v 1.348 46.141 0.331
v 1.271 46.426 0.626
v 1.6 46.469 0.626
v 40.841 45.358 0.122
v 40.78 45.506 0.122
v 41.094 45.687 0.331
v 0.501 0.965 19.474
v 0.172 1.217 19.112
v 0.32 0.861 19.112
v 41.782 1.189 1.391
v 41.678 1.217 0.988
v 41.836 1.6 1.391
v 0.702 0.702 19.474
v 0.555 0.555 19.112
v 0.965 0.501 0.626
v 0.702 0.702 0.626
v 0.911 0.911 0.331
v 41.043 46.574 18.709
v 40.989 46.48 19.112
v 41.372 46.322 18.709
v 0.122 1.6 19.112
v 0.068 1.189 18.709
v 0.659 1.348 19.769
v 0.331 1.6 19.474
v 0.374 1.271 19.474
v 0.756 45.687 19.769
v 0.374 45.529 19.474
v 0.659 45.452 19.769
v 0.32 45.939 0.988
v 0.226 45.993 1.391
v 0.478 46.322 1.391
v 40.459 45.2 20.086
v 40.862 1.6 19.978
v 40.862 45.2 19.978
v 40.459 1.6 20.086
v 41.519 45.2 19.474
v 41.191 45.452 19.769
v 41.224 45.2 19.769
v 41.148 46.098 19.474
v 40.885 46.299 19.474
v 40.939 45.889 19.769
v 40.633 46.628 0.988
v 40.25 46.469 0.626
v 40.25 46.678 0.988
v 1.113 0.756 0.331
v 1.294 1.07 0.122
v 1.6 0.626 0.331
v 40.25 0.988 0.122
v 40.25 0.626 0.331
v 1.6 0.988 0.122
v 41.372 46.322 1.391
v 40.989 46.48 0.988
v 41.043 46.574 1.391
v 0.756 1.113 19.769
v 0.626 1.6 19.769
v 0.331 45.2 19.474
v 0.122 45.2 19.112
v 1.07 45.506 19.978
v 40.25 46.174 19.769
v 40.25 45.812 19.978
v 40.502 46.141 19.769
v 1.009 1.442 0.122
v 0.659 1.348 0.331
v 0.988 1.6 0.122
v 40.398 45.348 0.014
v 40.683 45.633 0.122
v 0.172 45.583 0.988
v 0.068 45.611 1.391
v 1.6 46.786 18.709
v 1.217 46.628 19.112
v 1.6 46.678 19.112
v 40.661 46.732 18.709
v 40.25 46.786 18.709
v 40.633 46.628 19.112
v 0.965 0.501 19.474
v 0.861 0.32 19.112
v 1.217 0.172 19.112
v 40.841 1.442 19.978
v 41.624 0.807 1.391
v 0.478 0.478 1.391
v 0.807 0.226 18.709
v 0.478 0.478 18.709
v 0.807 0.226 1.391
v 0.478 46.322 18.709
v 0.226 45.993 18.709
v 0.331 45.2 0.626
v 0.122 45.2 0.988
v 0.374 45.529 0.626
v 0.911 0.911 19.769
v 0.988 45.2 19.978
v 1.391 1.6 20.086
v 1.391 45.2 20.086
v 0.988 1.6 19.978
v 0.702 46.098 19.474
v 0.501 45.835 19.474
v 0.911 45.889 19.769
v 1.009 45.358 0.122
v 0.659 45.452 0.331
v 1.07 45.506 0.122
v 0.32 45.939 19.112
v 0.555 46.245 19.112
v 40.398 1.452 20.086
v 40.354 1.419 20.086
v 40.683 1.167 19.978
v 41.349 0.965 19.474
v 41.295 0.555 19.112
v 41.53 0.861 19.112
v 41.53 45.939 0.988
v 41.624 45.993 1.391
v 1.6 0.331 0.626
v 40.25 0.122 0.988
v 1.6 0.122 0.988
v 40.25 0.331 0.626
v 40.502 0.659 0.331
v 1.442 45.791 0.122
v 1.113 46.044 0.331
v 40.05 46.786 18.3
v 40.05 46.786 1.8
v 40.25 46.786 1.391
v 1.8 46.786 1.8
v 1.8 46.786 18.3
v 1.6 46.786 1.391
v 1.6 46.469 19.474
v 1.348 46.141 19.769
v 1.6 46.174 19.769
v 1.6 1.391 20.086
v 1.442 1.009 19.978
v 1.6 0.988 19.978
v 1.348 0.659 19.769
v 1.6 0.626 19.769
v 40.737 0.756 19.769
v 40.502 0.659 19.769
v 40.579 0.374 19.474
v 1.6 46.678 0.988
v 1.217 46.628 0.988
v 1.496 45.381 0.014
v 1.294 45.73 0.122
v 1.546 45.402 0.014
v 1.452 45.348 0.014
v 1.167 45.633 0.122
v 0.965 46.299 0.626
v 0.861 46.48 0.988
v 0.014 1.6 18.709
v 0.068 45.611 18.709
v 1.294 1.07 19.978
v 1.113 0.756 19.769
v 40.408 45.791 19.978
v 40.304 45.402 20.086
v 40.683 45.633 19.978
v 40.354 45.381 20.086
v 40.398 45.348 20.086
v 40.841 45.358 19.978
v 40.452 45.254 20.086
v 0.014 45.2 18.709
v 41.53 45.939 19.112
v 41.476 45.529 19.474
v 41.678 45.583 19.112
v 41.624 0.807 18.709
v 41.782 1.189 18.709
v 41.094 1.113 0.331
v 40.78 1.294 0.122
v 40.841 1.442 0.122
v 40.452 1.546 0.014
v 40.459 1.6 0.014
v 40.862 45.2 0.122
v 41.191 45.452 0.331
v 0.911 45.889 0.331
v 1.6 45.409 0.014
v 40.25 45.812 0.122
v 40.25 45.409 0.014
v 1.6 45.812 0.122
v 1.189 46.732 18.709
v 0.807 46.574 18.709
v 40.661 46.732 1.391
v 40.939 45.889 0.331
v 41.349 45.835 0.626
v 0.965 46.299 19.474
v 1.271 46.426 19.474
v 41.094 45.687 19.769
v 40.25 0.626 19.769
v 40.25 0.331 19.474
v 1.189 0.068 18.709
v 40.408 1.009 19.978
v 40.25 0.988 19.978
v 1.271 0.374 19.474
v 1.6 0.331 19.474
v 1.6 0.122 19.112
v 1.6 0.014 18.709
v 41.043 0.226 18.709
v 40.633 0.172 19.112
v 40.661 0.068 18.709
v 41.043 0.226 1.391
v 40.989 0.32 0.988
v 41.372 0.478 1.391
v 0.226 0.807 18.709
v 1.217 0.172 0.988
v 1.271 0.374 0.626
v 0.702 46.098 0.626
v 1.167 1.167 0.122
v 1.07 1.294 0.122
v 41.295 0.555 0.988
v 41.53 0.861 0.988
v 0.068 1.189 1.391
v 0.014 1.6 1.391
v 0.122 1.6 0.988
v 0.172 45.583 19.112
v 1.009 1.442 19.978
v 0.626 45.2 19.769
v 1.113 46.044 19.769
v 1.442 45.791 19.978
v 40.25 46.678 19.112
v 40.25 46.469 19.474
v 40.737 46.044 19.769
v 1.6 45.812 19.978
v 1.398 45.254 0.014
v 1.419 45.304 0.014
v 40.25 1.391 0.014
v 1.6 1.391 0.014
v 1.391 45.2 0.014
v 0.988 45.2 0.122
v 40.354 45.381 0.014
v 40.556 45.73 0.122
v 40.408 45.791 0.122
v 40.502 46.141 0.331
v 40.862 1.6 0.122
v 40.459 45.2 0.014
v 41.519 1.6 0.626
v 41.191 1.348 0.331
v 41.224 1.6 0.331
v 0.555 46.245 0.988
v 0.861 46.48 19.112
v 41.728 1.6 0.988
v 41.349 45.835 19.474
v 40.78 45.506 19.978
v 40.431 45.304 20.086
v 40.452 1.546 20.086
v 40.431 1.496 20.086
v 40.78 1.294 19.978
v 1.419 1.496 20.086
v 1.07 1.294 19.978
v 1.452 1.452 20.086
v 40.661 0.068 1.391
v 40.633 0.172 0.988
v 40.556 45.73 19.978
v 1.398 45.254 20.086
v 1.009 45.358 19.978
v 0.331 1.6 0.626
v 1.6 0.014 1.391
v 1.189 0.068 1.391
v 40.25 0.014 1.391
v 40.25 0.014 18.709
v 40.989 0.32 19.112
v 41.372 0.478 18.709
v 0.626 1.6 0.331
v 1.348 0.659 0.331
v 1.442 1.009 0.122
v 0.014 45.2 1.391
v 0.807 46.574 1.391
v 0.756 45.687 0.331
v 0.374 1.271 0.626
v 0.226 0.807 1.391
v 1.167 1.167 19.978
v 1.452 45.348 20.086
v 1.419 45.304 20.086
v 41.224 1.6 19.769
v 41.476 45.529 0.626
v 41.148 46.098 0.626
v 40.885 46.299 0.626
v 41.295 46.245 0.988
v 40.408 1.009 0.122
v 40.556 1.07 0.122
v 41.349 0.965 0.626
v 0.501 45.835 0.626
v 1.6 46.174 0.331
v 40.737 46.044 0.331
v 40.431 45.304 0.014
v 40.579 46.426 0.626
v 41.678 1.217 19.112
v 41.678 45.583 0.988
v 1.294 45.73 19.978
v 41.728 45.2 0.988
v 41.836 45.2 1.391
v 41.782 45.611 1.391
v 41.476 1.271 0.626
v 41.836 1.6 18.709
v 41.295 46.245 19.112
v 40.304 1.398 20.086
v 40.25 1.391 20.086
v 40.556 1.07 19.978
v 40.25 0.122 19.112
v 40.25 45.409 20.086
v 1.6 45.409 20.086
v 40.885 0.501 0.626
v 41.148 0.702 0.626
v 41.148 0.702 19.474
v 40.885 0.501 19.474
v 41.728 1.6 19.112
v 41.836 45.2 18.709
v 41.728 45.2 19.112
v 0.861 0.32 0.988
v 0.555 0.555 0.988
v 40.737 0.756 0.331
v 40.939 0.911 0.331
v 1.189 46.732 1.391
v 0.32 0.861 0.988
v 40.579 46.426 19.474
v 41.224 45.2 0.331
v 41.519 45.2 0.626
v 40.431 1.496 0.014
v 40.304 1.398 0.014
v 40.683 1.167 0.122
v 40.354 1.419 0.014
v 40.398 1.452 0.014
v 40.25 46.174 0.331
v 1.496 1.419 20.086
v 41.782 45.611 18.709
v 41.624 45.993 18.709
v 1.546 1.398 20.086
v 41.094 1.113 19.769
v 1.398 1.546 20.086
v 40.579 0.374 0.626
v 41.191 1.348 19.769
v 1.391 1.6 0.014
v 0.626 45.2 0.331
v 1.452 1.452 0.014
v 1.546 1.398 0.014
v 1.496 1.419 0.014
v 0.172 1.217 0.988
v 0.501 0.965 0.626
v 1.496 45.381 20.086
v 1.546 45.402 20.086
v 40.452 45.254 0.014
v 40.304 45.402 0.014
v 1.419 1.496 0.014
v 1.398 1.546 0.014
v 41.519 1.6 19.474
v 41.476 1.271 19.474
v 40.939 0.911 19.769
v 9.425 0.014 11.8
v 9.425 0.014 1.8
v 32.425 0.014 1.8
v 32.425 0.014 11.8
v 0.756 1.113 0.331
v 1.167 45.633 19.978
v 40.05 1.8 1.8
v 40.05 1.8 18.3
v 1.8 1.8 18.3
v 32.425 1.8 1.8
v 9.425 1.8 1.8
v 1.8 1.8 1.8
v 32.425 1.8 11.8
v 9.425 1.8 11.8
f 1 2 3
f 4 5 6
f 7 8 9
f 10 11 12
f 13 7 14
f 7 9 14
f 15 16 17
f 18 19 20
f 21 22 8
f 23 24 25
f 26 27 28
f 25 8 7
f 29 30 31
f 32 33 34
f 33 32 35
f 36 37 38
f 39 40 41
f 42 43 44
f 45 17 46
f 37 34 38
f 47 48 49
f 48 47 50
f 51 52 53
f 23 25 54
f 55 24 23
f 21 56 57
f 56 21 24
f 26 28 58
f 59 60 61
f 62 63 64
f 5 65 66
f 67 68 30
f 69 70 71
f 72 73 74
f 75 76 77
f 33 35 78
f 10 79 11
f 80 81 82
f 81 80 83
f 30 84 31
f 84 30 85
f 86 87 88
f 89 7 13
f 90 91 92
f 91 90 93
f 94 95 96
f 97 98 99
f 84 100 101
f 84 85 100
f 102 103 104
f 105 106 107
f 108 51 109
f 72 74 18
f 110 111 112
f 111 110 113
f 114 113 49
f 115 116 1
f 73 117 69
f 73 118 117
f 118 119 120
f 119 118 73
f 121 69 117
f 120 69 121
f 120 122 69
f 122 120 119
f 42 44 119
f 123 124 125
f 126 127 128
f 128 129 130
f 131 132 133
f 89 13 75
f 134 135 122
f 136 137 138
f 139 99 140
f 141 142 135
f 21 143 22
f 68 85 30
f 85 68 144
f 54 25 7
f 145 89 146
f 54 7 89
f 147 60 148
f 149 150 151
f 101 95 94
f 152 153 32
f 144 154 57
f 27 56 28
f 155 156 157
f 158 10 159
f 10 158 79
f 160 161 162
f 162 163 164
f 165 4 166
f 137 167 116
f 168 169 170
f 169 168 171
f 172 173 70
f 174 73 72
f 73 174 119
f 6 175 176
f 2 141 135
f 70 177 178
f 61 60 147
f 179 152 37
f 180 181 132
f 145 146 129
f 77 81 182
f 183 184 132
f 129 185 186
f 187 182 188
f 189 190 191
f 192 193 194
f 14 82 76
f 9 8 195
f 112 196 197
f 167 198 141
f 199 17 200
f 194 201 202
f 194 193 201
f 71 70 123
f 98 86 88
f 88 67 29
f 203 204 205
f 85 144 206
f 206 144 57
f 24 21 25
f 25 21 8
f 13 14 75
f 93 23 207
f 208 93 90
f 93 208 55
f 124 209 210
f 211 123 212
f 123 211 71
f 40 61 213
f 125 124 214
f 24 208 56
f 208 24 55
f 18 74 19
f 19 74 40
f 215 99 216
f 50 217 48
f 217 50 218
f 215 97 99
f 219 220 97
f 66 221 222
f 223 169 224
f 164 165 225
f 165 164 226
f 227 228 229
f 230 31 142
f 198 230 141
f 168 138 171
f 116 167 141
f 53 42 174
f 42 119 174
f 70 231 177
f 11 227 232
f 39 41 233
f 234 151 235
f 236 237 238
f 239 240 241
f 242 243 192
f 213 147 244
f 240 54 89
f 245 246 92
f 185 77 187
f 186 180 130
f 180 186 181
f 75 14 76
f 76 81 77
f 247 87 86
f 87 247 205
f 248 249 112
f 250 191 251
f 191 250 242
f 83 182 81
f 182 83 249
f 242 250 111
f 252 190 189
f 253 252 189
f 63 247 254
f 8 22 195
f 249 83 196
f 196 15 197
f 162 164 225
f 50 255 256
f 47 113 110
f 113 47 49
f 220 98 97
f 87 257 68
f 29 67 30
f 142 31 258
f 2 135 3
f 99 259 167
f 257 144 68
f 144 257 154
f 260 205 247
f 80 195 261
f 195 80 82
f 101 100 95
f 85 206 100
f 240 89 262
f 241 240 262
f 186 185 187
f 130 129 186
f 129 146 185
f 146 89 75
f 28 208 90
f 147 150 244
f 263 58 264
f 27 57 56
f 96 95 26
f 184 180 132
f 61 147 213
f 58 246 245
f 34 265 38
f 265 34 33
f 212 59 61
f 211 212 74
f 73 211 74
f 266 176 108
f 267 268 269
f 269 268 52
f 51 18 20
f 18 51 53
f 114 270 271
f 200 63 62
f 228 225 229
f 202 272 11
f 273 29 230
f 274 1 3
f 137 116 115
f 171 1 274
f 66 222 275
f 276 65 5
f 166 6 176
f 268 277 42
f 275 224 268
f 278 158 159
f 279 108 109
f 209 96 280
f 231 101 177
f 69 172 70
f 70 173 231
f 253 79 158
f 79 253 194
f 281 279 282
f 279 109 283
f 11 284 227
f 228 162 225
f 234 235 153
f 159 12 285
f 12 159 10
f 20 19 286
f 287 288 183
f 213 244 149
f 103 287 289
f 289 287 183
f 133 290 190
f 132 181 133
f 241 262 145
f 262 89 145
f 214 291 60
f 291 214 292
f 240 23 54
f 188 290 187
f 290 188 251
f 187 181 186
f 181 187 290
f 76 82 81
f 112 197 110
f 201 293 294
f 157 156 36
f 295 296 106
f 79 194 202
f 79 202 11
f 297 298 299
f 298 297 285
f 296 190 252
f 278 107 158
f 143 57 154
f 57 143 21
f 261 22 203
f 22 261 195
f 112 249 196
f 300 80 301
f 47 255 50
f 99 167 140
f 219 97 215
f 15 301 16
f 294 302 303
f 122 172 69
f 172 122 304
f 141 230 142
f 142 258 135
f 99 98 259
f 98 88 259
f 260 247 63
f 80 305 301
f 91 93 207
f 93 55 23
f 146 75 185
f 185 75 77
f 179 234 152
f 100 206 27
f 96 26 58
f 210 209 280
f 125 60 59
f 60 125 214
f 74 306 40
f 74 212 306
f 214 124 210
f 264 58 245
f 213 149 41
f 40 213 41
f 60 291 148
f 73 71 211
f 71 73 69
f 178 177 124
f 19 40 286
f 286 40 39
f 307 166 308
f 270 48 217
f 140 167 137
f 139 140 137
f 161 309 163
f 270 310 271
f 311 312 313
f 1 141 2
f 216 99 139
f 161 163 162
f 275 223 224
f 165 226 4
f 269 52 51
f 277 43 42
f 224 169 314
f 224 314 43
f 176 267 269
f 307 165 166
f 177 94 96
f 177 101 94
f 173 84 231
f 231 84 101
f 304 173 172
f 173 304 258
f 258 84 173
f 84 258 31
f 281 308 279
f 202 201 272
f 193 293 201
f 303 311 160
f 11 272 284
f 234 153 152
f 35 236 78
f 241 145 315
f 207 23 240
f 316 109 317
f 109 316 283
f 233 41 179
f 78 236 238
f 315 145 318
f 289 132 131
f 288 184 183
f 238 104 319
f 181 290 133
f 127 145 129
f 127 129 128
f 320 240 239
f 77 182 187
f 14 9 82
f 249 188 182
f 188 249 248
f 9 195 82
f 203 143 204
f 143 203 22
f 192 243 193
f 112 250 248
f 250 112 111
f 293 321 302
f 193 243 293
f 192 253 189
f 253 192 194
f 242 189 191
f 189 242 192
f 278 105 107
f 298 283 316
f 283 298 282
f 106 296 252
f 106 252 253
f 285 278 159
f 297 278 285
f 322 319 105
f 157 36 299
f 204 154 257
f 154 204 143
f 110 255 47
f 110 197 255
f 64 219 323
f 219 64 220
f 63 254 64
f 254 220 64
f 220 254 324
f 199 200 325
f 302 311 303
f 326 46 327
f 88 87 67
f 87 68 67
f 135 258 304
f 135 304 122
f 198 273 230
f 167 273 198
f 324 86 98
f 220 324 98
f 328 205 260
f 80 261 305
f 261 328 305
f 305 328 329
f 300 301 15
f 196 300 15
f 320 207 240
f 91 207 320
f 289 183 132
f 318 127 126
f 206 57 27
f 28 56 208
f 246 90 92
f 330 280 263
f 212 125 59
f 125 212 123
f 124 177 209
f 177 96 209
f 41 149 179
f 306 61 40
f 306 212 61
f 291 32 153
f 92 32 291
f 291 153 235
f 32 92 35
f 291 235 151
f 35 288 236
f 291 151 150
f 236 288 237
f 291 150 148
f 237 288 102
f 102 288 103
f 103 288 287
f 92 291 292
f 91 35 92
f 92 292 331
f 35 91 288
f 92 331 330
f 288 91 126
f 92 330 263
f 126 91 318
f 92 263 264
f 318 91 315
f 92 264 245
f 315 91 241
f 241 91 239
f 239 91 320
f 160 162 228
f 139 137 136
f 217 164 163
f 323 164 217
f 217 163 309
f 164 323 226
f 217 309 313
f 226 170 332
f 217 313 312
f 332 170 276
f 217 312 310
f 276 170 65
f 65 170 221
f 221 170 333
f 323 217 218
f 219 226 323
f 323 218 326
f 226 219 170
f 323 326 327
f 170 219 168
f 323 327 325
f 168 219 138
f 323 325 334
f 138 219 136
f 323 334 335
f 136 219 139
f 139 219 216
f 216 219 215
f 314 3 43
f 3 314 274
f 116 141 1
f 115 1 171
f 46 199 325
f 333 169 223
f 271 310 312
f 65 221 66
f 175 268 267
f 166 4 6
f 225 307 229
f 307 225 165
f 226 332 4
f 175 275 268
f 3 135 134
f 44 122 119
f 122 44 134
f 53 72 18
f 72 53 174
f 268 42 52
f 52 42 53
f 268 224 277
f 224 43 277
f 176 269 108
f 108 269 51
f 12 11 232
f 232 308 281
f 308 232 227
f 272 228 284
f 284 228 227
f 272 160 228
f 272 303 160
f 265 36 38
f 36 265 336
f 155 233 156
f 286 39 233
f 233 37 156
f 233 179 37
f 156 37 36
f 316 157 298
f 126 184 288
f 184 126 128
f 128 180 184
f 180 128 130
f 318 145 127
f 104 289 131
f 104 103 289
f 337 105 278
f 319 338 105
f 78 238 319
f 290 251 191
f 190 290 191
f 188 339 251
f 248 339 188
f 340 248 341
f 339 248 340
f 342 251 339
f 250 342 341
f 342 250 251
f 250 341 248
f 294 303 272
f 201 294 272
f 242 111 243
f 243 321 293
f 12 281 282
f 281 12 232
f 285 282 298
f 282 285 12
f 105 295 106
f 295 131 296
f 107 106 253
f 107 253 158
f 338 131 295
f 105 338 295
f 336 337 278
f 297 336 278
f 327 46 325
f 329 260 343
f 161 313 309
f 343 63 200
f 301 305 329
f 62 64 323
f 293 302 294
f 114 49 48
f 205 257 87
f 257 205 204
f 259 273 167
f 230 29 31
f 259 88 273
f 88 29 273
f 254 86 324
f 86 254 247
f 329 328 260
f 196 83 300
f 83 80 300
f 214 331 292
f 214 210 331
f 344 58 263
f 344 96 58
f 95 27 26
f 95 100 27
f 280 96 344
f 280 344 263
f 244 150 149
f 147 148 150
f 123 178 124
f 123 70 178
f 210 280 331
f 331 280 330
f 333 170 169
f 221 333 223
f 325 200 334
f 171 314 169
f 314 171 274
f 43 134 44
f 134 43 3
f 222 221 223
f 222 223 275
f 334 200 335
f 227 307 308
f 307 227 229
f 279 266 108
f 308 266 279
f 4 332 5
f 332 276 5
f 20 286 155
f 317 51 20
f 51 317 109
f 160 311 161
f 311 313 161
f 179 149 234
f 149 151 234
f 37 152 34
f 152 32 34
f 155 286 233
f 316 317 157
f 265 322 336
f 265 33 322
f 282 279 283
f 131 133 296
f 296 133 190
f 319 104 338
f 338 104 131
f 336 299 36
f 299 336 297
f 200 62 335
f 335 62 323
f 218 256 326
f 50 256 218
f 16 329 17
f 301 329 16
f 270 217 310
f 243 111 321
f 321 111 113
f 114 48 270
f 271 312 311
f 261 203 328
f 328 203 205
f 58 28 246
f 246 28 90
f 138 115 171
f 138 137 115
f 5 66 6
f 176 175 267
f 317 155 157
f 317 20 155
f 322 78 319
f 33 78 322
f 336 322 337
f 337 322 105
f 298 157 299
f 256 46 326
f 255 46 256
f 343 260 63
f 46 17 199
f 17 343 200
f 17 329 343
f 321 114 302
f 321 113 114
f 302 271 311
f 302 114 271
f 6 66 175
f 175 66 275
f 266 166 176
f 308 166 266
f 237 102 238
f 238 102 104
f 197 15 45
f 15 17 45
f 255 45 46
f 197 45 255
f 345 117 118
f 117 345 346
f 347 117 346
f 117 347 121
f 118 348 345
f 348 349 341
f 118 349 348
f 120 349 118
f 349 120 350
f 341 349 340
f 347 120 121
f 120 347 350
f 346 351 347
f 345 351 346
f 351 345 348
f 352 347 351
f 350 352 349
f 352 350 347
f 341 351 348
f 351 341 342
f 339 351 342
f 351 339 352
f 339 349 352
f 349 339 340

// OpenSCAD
// file: rounded-cube.scad
rounded_cube([10, 10, 10]);

module rounded_cube(size, radius = 1)
{
    hull()
    {
        x = size[0];
        y = size[1];
        z = size[2];

        translate([radius, radius, radius])
        sphere(r = radius);

        translate([x - radius, radius, radius])
        sphere(r = radius);

        translate([x - radius, y - radius, radius])
        sphere(r = radius);

        translate([radius, y - radius, radius])
        sphere(r = radius);

        translate([radius, radius, z - radius])
        sphere(r = radius);

        translate([x - radius, radius, z - radius])
        sphere(r = radius);

        translate([x - radius, y - radius, z - radius])
        sphere(r = radius);

        translate([radius, y - radius, z - radius])
        sphere(r = radius);
    }
}
// main file
use <rounded-cube.scad>;

$fn = 24;

inner_height = 45;
inner_width = 35.25 + 3;
inner_depth = 11.5 + 5;
hole_width = 20 + 3;
hole_depth = 10;
wall_thickness = 1.8;
corenr_radius = 1.6;

sd_adapter_holder();

module sd_adapter_holder()
{
    difference()
    {
        // main body
        rounded_cube([
            inner_width + 2 * wall_thickness,
            inner_height + wall_thickness,
            inner_depth + 2 * wall_thickness
        ], radius = corenr_radius);

        // main hole
        translate([wall_thickness, wall_thickness, wall_thickness])
        cube([
            inner_width,
            inner_height + 1,
            inner_depth
        ]);

        // ribbon cable
        ribbon_hole_position_x = wall_thickness + ((inner_width - hole_width) / 2);
        //ribbon_hole_position_z = wall_thickness + ((inner_depth - hole_depth) / 2);
        translate([ribbon_hole_position_x, -1, wall_thickness])
        cube([
            hole_width,
            wall_thickness + 2,
            hole_depth
        ]);
    }
}
